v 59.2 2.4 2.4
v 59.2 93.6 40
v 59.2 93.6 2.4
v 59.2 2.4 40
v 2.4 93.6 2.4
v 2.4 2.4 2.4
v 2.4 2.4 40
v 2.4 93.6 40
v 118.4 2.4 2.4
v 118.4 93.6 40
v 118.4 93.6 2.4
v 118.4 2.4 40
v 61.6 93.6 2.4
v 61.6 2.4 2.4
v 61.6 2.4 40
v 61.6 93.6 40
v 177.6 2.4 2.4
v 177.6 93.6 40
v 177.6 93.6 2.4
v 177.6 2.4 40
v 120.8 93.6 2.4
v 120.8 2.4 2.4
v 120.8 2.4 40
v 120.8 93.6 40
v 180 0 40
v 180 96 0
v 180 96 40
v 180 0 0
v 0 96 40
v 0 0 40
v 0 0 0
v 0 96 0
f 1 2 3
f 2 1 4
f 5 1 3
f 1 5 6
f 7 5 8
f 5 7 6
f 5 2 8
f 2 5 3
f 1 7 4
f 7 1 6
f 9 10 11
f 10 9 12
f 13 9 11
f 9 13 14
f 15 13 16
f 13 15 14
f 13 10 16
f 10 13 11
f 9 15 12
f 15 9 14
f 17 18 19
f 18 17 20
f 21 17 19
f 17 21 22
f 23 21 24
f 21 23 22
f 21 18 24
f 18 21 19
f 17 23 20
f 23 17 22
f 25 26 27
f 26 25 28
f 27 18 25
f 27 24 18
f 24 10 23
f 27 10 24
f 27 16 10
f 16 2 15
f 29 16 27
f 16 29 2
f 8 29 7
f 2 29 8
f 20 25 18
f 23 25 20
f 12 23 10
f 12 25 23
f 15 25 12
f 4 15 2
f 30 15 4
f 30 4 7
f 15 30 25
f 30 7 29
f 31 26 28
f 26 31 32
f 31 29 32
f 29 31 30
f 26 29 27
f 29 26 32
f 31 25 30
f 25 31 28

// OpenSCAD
// Drawer Grid — an editable family of dry-use organizers. Millimetres.
// The checked builder calls this module with the saved design.json values.
// Top-level geometry is a desktop preview only; it is ignored during export.
module part(id, width=180, depth=96, height=40, wall=2.4, floor=2.4, columns=3) {
    assert(id == "tray", "Unknown part");
    assert(columns >= 2 && floor > 0 && height > floor && wall > 0);
    pocket_width = (width - (columns + 1) * wall) / columns;
    assert(pocket_width > 10 && depth > 2 * wall + 10, "Compartments are too small");
    difference() {
        cube([width, depth, height]);
        for (column = [0:columns-1])
            translate([wall + column * (pocket_width + wall), wall, floor])
                cube([pocket_width, depth - 2 * wall, height + 1]);
    }
}
part("tray");
